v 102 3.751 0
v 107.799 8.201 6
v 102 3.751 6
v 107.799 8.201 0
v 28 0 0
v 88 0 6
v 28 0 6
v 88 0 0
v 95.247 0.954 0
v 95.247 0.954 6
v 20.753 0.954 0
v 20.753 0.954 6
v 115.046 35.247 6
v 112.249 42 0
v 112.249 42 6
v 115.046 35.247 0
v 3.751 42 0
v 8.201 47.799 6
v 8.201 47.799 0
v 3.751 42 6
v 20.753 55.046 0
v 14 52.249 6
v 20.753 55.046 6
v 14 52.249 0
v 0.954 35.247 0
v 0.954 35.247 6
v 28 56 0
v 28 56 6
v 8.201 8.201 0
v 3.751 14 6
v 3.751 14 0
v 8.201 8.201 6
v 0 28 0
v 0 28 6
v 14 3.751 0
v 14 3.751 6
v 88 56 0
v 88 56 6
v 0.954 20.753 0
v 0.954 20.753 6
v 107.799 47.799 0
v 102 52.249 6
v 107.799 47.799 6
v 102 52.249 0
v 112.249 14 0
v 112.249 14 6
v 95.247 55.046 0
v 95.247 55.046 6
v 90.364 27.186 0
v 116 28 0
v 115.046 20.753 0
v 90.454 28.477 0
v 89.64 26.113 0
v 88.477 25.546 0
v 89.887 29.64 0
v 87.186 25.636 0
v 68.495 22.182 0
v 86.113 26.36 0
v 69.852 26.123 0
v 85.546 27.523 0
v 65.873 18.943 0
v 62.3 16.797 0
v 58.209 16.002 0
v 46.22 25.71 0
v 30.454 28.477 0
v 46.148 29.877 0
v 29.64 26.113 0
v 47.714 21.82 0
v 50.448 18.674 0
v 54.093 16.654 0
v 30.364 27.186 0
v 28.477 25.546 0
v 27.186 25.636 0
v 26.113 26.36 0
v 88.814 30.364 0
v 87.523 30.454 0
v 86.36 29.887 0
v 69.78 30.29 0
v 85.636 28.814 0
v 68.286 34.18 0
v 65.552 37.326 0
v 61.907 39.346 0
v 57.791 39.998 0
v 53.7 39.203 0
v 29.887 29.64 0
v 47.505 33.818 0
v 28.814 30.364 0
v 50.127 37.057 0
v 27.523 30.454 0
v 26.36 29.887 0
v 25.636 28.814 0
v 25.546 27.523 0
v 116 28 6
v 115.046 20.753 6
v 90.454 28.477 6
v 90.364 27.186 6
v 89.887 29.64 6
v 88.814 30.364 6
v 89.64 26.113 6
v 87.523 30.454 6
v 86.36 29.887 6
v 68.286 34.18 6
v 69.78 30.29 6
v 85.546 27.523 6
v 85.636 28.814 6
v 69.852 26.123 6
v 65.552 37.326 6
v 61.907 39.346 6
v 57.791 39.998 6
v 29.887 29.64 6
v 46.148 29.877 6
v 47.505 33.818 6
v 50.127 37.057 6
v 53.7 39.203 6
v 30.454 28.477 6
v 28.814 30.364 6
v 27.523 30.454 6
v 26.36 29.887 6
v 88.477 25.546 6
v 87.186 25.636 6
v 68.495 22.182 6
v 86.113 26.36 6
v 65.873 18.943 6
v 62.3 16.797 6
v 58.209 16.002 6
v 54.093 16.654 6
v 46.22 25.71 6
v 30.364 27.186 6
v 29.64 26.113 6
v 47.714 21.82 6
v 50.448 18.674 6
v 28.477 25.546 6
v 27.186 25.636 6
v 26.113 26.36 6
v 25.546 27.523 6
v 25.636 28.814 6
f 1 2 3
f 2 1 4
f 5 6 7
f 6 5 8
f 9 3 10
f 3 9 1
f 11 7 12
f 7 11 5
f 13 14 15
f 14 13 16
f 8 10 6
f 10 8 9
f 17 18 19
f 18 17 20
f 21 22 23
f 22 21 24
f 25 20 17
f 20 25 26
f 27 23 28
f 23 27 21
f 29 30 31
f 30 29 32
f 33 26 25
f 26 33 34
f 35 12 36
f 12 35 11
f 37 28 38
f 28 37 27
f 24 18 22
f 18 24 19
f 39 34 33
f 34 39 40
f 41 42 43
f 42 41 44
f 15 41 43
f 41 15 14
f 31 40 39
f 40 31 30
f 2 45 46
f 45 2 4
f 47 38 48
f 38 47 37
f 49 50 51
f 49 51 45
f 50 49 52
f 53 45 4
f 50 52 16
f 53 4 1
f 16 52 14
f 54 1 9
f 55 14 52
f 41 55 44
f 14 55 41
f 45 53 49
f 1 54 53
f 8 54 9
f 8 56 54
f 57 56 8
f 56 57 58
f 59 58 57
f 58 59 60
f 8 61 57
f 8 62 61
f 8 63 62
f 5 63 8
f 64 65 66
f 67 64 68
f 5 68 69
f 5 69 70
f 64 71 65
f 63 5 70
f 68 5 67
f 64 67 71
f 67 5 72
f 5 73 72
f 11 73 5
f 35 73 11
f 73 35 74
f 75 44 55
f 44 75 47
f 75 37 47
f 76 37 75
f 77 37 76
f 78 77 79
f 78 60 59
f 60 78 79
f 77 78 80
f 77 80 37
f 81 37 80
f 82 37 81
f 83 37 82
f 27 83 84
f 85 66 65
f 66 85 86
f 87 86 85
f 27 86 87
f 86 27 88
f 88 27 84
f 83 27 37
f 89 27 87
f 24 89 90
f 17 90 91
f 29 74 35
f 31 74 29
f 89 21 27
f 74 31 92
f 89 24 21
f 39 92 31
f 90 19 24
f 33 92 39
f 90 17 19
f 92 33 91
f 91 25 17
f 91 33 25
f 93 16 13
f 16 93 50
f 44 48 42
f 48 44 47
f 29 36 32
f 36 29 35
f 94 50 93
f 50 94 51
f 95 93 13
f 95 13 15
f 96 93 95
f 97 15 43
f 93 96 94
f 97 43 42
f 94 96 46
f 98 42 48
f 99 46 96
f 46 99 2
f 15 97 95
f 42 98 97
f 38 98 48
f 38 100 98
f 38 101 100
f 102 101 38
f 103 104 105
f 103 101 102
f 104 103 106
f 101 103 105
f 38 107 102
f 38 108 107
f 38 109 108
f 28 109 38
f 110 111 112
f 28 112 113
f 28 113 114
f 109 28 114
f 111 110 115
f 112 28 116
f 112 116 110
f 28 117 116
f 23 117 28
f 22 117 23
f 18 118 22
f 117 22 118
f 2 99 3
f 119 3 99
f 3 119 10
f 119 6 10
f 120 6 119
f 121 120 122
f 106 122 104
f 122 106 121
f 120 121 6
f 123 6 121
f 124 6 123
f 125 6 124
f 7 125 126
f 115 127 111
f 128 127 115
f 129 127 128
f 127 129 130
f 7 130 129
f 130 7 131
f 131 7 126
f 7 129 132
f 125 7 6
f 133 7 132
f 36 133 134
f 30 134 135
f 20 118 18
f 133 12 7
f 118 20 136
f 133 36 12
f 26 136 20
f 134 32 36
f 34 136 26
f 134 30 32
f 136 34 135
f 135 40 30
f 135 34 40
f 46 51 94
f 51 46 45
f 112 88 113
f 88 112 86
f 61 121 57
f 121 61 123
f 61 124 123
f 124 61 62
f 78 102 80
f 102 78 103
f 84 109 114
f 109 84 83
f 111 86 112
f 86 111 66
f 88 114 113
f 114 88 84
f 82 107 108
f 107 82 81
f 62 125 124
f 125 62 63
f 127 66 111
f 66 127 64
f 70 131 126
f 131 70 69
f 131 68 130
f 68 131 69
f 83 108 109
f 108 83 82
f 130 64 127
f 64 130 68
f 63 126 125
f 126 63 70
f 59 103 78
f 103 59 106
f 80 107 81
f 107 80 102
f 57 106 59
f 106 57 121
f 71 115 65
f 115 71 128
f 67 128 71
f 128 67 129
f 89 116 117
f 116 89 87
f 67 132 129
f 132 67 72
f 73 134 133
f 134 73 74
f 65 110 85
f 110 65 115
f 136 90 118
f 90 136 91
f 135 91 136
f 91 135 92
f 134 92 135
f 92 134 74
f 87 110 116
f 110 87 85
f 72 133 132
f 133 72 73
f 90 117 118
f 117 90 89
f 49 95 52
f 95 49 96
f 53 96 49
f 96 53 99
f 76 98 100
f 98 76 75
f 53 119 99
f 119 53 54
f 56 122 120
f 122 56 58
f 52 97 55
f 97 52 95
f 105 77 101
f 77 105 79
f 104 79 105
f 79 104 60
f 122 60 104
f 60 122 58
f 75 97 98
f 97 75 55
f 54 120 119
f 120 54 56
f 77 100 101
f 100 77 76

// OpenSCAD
$fn = 32;

// ----------------------------------------------------------------------
// Spacer plate: obround span 60, caps R28
// ----------------------------------------------------------------------

// --- parameters (mm) ---
bore_r = 12;              // centre bore radius
bolt_r = 2.5;             // bolt hole radius
plate_t = 6;              // plate thickness, Z (extrusion height)
span = 60;                // obround span
cap_r = 28;               // cap radius

profile = [[28, 56], [20.753, 55.046], [14, 52.249], [8.201, 47.799], [3.751, 42], [0.954, 35.247], [0, 28], [0.954, 20.753], [3.751, 14], [8.201, 8.201], [14, 3.751], [20.753, 0.954], [28, 0], [88, 0], [95.247, 0.954], [102, 3.751], [107.799, 8.201], [112.249, 14], [115.046, 20.753], [116, 28], [115.046, 35.247], [112.249, 42], [107.799, 47.799], [102, 52.249], [95.247, 55.046], [88, 56]];  // primary outline, 26 points, counter clockwise
void_1 = [[69.78, 30.29], [68.286, 34.18], [65.552, 37.326], [61.907, 39.346], [57.791, 39.998], [53.7, 39.203], [50.127, 37.057], [47.505, 33.818], [46.148, 29.877], [46.22, 25.71], [47.714, 21.82], [50.448, 18.674], [54.093, 16.654], [58.209, 16.002], [62.3, 16.797], [65.873, 18.943], [68.495, 22.182], [69.852, 26.123]];  // centre bore, 18 points
void_2 = [[30.454, 28.477], [29.887, 29.64], [28.814, 30.364], [27.523, 30.454], [26.36, 29.887], [25.636, 28.814], [25.546, 27.523], [26.113, 26.36], [27.186, 25.636], [28.477, 25.546], [29.64, 26.113], [30.364, 27.186]];  // end hole, 12 points
void_3 = [[90.454, 28.477], [89.887, 29.64], [88.814, 30.364], [87.523, 30.454], [86.36, 29.887], [85.636, 28.814], [85.546, 27.523], [86.113, 26.36], [87.186, 25.636], [88.477, 25.546], [89.64, 26.113], [90.364, 27.186]];  // end hole, 12 points

// --- the one profile operation ---
difference() {
  linear_extrude(height = plate_t) polygon(points = profile);
  translate([0, 0, -1])
    linear_extrude(height = plate_t + 2) polygon(points = void_1);
  translate([0, 0, -1])
    linear_extrude(height = plate_t + 2) polygon(points = void_2);
  translate([0, 0, -1])
    linear_extrude(height = plate_t + 2) polygon(points = void_3);
}
